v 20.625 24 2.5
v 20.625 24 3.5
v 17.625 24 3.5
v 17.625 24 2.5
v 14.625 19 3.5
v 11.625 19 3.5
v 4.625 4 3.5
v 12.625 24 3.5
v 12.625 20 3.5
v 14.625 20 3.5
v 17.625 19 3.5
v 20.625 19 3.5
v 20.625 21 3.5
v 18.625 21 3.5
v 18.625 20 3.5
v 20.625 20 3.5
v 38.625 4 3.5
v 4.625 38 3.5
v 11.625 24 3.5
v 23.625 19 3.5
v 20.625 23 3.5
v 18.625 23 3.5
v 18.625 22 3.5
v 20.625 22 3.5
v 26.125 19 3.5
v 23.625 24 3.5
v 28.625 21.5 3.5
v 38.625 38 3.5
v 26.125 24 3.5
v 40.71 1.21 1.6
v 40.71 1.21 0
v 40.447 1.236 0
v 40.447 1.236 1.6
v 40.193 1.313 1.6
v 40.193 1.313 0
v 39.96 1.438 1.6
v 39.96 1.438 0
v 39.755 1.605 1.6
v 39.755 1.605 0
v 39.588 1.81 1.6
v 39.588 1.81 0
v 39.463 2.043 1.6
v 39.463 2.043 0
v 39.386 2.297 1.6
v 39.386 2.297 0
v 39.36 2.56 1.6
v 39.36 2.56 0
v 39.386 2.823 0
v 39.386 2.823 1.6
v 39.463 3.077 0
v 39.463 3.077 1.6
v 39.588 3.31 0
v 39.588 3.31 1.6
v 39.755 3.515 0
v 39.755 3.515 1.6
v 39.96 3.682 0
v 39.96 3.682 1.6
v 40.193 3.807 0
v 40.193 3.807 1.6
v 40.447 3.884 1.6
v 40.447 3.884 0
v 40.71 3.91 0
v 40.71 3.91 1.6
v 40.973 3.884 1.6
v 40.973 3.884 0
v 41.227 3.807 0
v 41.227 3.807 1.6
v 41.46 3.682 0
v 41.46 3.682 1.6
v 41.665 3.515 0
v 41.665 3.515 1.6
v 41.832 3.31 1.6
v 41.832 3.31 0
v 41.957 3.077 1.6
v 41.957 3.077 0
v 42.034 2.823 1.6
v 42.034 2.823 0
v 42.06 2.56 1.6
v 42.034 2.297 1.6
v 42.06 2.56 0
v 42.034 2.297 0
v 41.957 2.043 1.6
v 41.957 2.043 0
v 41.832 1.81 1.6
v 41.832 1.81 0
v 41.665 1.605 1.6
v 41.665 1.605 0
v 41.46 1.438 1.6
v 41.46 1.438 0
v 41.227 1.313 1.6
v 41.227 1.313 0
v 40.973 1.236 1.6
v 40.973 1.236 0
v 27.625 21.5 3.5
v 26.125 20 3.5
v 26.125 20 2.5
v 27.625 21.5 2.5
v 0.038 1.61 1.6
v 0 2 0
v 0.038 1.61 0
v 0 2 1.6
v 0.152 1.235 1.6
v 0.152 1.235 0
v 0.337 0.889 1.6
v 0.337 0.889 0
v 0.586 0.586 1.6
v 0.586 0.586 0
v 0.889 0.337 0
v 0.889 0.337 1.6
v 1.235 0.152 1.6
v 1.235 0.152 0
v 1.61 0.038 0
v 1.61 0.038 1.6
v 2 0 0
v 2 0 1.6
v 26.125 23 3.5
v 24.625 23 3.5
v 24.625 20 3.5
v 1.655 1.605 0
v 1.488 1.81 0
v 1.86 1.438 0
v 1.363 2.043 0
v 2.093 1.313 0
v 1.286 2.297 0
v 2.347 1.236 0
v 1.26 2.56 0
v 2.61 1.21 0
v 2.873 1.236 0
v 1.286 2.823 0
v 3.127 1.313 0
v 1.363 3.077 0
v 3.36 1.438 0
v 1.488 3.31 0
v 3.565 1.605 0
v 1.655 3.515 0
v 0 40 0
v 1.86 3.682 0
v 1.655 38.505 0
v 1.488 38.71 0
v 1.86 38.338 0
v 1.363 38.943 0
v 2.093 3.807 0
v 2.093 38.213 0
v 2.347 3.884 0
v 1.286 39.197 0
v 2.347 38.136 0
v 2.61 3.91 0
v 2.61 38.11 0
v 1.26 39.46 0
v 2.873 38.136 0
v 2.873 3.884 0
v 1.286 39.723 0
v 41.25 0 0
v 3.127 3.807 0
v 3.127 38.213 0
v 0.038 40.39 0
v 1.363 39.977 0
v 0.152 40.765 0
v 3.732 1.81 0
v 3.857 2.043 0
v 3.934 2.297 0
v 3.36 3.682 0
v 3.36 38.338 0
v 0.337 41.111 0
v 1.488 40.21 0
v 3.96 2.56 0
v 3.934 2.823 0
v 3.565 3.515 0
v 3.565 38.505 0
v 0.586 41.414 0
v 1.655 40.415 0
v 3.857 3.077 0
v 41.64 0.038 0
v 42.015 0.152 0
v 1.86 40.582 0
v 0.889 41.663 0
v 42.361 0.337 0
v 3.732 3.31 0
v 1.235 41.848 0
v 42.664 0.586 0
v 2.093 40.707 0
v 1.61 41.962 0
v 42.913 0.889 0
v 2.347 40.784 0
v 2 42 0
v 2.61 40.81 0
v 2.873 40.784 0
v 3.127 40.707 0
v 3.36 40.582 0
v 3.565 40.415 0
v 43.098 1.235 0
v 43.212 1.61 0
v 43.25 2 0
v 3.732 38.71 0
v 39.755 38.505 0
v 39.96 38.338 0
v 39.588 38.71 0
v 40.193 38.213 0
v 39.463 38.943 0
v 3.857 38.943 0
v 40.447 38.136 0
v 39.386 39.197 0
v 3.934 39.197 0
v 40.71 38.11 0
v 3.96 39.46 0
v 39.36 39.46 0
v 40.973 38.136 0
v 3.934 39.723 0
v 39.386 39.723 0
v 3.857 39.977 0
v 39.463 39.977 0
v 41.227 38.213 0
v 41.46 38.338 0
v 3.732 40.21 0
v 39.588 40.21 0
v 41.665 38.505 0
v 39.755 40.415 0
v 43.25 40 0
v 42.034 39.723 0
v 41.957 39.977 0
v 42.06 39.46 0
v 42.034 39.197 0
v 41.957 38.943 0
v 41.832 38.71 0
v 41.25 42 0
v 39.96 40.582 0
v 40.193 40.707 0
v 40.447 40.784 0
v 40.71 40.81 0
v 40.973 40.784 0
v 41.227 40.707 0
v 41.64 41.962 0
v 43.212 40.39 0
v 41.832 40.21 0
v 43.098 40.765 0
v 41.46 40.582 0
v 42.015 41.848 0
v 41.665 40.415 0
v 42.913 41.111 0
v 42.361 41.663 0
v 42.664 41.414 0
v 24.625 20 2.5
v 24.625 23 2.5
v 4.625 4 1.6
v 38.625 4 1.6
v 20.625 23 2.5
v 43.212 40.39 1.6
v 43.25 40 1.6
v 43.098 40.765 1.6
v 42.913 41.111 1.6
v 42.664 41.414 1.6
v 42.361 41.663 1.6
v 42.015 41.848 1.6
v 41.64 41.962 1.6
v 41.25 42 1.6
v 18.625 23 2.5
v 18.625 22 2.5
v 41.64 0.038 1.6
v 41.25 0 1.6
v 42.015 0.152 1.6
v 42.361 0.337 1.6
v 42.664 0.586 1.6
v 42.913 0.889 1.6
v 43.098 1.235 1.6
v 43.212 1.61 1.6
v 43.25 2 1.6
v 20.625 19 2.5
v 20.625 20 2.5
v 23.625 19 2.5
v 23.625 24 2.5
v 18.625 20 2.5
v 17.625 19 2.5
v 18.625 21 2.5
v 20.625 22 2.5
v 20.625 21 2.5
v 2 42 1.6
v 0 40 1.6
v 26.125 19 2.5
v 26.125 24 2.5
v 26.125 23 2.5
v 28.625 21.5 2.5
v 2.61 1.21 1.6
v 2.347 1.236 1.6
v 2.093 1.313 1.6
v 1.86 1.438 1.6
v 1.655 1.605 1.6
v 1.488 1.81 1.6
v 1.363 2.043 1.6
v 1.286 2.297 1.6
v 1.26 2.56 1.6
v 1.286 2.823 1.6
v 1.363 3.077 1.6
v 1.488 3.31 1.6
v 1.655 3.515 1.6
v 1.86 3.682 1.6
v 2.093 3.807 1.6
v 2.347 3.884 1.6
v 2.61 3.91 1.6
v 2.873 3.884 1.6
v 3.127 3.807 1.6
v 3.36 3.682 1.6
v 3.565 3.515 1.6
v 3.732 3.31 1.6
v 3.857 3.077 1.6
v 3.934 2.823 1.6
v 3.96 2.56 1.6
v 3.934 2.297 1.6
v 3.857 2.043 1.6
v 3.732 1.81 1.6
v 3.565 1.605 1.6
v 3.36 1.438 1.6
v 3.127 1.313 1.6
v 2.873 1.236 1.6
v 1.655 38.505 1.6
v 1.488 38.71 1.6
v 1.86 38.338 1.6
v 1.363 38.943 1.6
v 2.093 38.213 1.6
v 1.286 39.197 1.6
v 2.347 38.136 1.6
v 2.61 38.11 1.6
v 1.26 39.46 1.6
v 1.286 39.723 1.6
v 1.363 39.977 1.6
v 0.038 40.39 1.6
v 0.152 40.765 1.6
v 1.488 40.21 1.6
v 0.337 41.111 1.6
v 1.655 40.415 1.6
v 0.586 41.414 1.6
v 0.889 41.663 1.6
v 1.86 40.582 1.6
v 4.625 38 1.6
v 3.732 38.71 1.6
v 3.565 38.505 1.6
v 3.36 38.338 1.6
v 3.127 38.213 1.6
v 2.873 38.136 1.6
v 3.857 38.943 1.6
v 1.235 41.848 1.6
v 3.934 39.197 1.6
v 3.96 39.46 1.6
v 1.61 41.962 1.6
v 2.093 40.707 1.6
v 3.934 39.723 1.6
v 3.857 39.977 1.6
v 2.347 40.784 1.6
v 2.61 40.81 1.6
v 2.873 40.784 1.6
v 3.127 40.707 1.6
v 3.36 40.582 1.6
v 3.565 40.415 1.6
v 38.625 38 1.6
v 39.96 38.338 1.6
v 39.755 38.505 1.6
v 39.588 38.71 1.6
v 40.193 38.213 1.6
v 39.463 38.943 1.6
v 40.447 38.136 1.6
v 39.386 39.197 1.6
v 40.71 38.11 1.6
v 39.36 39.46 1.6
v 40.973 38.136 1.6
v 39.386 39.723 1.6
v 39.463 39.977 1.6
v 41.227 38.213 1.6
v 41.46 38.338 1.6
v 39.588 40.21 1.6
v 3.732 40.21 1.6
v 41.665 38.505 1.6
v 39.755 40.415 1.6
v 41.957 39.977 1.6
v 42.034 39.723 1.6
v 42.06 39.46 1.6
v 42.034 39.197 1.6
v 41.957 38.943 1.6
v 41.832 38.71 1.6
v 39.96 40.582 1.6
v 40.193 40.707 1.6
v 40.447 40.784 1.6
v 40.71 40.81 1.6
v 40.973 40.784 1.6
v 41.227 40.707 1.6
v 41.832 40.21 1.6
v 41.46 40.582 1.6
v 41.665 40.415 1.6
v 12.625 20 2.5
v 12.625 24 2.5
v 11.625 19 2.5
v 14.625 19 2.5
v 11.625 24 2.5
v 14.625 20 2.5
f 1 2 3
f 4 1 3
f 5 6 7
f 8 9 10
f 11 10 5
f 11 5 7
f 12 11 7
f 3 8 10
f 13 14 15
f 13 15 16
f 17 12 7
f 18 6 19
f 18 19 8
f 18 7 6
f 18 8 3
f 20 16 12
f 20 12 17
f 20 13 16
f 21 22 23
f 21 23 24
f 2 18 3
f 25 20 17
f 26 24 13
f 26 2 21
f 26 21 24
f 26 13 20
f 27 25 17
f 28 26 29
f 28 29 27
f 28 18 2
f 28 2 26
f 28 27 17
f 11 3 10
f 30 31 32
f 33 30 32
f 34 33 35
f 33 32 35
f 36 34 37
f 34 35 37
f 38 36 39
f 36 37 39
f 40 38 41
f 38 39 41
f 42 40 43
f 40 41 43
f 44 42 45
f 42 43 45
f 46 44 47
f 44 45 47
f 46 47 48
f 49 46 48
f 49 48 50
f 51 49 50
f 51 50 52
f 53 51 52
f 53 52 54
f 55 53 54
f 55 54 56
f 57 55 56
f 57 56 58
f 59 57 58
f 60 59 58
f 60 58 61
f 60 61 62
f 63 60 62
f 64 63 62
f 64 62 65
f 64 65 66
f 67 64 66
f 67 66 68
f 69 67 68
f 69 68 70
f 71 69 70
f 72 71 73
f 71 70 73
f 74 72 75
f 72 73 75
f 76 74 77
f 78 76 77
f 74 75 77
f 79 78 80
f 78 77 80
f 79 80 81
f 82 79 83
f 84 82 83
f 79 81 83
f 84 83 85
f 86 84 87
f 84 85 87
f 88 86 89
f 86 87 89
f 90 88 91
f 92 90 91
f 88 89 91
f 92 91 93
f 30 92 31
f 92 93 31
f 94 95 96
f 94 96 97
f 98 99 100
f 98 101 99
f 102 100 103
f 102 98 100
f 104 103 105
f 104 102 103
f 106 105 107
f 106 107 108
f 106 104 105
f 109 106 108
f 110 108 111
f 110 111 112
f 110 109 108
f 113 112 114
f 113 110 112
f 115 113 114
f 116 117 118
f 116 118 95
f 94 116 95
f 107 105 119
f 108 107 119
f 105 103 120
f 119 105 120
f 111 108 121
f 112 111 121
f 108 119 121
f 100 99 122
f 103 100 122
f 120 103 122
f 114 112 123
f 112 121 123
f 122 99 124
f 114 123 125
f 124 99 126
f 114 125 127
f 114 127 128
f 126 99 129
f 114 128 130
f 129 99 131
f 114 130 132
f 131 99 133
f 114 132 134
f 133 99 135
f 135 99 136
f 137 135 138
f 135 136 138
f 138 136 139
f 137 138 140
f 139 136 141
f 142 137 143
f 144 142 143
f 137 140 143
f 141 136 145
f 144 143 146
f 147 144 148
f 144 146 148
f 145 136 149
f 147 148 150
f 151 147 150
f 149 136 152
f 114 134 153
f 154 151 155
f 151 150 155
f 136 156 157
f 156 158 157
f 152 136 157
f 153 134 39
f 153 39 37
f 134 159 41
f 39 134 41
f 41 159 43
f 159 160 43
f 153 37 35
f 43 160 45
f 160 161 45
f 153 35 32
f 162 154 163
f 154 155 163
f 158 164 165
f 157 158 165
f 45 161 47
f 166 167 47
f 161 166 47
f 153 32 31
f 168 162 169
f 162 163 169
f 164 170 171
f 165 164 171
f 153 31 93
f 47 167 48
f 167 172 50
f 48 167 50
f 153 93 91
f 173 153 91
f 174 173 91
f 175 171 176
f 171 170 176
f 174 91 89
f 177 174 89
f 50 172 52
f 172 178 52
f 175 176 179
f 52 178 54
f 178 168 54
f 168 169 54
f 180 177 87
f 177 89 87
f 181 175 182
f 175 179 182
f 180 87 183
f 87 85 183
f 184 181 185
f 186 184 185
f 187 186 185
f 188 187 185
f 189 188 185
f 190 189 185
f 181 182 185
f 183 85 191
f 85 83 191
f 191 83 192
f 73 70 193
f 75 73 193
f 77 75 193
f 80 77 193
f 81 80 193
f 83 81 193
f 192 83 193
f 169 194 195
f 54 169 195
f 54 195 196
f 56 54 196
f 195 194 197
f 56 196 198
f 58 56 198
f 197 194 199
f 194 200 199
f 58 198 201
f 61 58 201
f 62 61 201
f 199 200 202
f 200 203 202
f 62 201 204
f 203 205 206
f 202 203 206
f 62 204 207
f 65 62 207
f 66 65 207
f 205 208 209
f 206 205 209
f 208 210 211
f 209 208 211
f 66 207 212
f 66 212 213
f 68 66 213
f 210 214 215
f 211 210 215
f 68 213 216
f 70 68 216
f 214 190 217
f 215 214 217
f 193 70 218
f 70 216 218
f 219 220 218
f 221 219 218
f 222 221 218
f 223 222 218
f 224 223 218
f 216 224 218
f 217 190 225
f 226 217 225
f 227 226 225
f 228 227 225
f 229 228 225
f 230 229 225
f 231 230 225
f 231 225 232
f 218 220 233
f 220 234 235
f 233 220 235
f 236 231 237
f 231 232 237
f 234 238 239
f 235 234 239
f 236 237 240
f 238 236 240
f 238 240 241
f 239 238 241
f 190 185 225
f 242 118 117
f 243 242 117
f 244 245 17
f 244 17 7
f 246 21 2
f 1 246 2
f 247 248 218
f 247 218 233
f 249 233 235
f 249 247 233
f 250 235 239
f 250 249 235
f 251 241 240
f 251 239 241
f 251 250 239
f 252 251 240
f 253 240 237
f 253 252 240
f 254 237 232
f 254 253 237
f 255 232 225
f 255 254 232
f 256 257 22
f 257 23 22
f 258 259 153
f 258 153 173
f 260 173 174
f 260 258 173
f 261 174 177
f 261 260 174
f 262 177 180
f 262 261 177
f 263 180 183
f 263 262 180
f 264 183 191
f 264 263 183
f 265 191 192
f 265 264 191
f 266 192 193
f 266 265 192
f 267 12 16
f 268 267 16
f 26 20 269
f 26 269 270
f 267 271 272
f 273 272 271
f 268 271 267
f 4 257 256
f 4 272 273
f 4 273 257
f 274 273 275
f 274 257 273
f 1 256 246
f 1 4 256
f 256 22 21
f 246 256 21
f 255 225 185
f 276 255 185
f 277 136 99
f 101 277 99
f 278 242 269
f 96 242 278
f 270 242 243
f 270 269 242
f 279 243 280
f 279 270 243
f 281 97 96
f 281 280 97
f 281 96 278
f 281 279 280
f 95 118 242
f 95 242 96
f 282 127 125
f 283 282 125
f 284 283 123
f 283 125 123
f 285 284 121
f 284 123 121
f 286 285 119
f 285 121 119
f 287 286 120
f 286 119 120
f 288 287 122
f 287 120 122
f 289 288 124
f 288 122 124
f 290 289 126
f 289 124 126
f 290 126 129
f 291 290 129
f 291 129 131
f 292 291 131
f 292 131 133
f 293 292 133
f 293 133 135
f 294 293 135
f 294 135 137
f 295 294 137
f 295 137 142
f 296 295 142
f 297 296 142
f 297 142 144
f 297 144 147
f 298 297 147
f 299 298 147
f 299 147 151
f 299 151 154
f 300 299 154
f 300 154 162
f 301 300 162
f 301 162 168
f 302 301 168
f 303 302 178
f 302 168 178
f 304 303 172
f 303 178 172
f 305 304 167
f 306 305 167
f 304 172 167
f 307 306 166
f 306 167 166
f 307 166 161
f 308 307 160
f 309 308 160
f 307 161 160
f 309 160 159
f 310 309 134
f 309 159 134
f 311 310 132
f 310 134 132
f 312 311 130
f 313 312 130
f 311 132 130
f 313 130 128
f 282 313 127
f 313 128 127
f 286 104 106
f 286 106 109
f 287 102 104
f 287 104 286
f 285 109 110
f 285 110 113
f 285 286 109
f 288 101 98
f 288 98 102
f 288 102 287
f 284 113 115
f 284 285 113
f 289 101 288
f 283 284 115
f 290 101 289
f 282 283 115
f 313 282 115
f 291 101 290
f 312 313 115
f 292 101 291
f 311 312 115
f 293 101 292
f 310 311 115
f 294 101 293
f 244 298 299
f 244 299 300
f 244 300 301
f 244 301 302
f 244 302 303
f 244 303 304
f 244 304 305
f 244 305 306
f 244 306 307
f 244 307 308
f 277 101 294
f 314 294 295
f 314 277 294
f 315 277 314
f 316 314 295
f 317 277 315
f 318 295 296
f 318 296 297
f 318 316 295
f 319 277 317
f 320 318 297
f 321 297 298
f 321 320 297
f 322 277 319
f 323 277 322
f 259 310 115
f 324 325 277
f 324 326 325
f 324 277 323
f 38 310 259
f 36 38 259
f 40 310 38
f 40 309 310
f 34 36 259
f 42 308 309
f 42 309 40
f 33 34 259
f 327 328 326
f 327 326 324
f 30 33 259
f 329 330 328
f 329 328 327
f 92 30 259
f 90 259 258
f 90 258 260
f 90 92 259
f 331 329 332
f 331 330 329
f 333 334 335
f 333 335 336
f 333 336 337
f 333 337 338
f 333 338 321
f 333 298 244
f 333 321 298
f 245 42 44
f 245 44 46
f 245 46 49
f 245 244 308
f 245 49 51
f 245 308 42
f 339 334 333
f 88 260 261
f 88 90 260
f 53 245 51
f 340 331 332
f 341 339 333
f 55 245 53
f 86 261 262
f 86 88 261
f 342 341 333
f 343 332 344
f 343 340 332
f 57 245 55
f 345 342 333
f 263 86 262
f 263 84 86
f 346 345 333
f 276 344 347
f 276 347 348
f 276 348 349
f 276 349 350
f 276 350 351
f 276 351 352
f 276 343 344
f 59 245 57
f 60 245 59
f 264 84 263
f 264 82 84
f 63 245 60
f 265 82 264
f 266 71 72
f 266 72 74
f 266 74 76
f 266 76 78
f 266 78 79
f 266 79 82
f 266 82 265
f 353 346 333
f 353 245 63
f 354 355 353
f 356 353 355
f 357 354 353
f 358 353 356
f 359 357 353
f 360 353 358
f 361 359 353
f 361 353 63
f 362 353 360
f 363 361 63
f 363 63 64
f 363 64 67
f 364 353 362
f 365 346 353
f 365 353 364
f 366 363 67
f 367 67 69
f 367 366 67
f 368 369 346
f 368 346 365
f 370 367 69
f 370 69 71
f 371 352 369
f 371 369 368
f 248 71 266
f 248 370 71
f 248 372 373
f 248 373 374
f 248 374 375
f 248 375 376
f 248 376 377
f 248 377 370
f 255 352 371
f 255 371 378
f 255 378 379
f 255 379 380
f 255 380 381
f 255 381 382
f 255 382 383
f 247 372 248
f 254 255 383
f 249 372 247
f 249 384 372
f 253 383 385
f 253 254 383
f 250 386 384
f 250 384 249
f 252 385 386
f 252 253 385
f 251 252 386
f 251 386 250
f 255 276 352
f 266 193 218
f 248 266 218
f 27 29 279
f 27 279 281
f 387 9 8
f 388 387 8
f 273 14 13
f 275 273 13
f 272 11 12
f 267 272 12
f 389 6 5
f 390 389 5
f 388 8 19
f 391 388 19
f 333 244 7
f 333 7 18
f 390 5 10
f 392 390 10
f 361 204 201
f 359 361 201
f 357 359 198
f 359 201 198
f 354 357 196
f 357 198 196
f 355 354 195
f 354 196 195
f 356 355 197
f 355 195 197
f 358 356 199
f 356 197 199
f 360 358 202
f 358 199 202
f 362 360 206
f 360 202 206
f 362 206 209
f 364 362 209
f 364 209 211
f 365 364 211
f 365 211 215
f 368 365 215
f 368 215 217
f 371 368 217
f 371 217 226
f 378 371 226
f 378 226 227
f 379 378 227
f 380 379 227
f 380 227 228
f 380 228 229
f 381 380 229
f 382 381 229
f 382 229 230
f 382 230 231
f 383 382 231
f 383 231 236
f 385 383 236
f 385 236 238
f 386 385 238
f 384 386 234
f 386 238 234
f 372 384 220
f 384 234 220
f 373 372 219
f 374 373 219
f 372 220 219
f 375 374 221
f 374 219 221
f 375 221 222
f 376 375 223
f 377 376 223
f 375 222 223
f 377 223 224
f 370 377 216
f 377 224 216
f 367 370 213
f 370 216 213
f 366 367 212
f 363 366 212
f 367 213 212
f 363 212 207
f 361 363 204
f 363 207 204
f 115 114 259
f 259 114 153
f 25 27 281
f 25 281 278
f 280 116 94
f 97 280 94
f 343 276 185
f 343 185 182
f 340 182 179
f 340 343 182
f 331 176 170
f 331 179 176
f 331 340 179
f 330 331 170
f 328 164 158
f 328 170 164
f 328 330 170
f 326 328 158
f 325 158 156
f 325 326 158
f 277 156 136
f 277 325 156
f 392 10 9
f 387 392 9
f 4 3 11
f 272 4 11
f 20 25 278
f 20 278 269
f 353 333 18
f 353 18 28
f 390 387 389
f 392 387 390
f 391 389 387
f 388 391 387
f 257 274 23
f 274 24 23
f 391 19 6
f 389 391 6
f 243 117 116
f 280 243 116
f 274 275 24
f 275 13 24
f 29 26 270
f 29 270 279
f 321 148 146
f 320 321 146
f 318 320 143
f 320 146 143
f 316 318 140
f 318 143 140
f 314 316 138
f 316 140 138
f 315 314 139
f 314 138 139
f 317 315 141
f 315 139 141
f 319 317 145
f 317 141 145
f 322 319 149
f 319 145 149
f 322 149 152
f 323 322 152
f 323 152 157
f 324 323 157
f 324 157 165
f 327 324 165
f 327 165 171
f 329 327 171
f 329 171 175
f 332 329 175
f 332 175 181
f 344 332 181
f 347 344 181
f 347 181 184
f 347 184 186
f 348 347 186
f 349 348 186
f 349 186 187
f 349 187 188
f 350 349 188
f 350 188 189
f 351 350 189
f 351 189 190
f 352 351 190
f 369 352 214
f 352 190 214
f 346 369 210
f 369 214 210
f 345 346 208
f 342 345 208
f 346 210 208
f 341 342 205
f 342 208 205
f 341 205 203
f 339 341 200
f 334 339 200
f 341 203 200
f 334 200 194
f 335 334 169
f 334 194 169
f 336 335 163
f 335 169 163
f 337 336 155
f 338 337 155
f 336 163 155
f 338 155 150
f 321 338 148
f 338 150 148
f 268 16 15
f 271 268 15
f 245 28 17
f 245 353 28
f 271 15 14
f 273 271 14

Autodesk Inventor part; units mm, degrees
ref_plane "Plan YZ" through (0, 0, 0) normal (1, 0, 0) x (0, 1, 0)
ref_plane "Plan XZ" through (0, 0, 0) normal (0, 1, 0) x (-1, 0, 0)
ref_plane "Plan XY" through (0, 0, 0) normal (0, 0, 1) x (1, 0, 0)
sketch "Esquisse1" plane through (0, 0, 0) normal (0, 0, 1) x (1, 0, 0)
  line L0 (0, 0) -> (43.25, 0)
  line L1 (43.25, 0) -> (43.25, 42)
  line L2 (43.25, 42) -> (0, 42)
  line L3 (0, 42) -> (0, 0)
  dimension "d0" = 43.25
  dimension "d1" = 42
extrude "Extrusion1" add sketch "Esquisse1" along normal blind 1.6
sketch "Esquisse6" plane through (0, 0, 1.6) normal (0, 0, 1) x (1, 0, 0)
  line L0 (4.625, 38) -> (38.625, 38)
  line L1 (38.625, 38) -> (38.625, 4)
  line L2 (38.625, 4) -> (4.625, 4)
  line L3 (4.625, 4) -> (4.625, 38)
  line L4 (0, 27.3284) -> (4.625, 27.3284) construction
  line L5 (43.25, 21) -> (38.625, 21) construction
  line L6 (19.4191, 4) -> (19.4191, 0) construction
  line L7 (15.7943, 42) -> (15.7943, 38) construction
  line L8 (0, 0) -> (43.25, 0) construction
  line L9 (43.25, 42) -> (0, 42) construction
  line L10 (43.25, 0) -> (43.25, 42) construction
  line L11 (0, 42) -> (0, 0) construction
  dimension "d4" = 34
  dimension "d5" = 34
extrude "Extrusion2" add sketch "Esquisse6" along normal blind 1.9
sketch "Esquisse7" plane through (0, 0, 1.6) normal (0, 0, 1) x (1, 0, 0)
  line L0 (43.25, 0) -> (43.25, 42) projected
  line L1 (43.25, 42) -> (0, 42) projected
  point P0 (0, 0)
  point P1 (40.71, 39.46)
  dimension "d21" = 2.54
  dimension "d22" = 2.54
hole "Perçage1" at (40.71, 39.46, 1.6) direction (0, 0, -1) diameter 2.7 end through all
pattern_linear "Réseau rectangulaire1" count 2 spacing 36.9 along (0, -1, 0) count 2 spacing 38.1 along (-1, 0, 0) of "Perçage1"
sketch "Esquisse8" plane through (0, 0, 3.5) normal (0, 0, 1) x (1, 0, 0)
  line L0 (11.625, 24) -> (11.625, 19)
  line L1 (11.625, 19) -> (14.625, 19)
  line L2 (14.625, 19) -> (14.625, 20)
  line L3 (14.625, 20) -> (12.625, 20)
  line L4 (12.625, 20) -> (12.625, 24)
  line L5 (12.625, 24) -> (11.625, 24)
  line L6 (17.625, 24) -> (17.625, 19)
  line L7 (17.625, 19) -> (20.625, 19)
  line L8 (20.625, 19) -> (20.625, 20)
  line L9 (20.625, 20) -> (18.625, 20)
  line L10 (18.625, 20) -> (18.625, 21)
  line L11 (18.625, 21) -> (20.625, 21)
  line L12 (20.625, 21) -> (20.625, 22)
  line L13 (20.625, 22) -> (18.625, 22)
  line L14 (18.625, 22) -> (18.625, 23)
  line L15 (20.625, 23) -> (20.625, 24)
  line L16 (20.625, 24) -> (17.625, 24)
  line L17 (17.625, 24) -> (17.625, 24)
  line L18 (18.625, 23) -> (20.625, 23)
  line L19 (23.625, 19) -> (23.625, 24)
  line L20 (23.625, 24) -> (26.125, 24)
  line L21 (26.125, 24) -> (28.625, 21.5)
  line L22 (28.625, 21.5) -> (26.125, 19)
  line L23 (26.125, 19) -> (23.625, 19)
  line L24 (24.625, 20) -> (24.625, 23)
  line L25 (4.625, 38) -> (4.625, 4) projected
  line L26 (4.625, 4) -> (38.625, 4) projected
  line L27 (24.625, 20) -> (26.125, 20)
  line L28 (26.125, 20) -> (27.625, 21.5)
  line L29 (24.625, 23) -> (26.125, 23)
  line L30 (26.125, 23) -> (27.625, 21.5)
  point P0 (0, 0)
  dimension "d23" = 5
  dimension "d24" = 4
  dimension "d25" = 1
  dimension "d26" = 7
  dimension "d27" = 3
  dimension "d28" = 3
  dimension "d29" = 3
  dimension "d30" = 3
  dimension "d31" = 15
  dimension "d32" = 5
  dimension "d33" = 1
  dimension "d34" = 1
  dimension "d35" = 1
  dimension "d36" = 1
  dimension "d37" = 2
  dimension "d38" = 1
  dimension "d39" = 1
  dimension "d40" = 1
  dimension "d41" = 45
  dimension "d42" = 45
  dimension "d43" = 1
  dimension "d45" = 5
extrude "Extrusion3" cut sketch "Esquisse8" against normal blind 1
fillet "Congé1" radius 2 4 edges at (0, 42, 0.8) (43.25, 42, 0.8) (43.25, 0, 0.8) (0, 0, 0.8)
properties part number "P1704_014_Display" material "."
